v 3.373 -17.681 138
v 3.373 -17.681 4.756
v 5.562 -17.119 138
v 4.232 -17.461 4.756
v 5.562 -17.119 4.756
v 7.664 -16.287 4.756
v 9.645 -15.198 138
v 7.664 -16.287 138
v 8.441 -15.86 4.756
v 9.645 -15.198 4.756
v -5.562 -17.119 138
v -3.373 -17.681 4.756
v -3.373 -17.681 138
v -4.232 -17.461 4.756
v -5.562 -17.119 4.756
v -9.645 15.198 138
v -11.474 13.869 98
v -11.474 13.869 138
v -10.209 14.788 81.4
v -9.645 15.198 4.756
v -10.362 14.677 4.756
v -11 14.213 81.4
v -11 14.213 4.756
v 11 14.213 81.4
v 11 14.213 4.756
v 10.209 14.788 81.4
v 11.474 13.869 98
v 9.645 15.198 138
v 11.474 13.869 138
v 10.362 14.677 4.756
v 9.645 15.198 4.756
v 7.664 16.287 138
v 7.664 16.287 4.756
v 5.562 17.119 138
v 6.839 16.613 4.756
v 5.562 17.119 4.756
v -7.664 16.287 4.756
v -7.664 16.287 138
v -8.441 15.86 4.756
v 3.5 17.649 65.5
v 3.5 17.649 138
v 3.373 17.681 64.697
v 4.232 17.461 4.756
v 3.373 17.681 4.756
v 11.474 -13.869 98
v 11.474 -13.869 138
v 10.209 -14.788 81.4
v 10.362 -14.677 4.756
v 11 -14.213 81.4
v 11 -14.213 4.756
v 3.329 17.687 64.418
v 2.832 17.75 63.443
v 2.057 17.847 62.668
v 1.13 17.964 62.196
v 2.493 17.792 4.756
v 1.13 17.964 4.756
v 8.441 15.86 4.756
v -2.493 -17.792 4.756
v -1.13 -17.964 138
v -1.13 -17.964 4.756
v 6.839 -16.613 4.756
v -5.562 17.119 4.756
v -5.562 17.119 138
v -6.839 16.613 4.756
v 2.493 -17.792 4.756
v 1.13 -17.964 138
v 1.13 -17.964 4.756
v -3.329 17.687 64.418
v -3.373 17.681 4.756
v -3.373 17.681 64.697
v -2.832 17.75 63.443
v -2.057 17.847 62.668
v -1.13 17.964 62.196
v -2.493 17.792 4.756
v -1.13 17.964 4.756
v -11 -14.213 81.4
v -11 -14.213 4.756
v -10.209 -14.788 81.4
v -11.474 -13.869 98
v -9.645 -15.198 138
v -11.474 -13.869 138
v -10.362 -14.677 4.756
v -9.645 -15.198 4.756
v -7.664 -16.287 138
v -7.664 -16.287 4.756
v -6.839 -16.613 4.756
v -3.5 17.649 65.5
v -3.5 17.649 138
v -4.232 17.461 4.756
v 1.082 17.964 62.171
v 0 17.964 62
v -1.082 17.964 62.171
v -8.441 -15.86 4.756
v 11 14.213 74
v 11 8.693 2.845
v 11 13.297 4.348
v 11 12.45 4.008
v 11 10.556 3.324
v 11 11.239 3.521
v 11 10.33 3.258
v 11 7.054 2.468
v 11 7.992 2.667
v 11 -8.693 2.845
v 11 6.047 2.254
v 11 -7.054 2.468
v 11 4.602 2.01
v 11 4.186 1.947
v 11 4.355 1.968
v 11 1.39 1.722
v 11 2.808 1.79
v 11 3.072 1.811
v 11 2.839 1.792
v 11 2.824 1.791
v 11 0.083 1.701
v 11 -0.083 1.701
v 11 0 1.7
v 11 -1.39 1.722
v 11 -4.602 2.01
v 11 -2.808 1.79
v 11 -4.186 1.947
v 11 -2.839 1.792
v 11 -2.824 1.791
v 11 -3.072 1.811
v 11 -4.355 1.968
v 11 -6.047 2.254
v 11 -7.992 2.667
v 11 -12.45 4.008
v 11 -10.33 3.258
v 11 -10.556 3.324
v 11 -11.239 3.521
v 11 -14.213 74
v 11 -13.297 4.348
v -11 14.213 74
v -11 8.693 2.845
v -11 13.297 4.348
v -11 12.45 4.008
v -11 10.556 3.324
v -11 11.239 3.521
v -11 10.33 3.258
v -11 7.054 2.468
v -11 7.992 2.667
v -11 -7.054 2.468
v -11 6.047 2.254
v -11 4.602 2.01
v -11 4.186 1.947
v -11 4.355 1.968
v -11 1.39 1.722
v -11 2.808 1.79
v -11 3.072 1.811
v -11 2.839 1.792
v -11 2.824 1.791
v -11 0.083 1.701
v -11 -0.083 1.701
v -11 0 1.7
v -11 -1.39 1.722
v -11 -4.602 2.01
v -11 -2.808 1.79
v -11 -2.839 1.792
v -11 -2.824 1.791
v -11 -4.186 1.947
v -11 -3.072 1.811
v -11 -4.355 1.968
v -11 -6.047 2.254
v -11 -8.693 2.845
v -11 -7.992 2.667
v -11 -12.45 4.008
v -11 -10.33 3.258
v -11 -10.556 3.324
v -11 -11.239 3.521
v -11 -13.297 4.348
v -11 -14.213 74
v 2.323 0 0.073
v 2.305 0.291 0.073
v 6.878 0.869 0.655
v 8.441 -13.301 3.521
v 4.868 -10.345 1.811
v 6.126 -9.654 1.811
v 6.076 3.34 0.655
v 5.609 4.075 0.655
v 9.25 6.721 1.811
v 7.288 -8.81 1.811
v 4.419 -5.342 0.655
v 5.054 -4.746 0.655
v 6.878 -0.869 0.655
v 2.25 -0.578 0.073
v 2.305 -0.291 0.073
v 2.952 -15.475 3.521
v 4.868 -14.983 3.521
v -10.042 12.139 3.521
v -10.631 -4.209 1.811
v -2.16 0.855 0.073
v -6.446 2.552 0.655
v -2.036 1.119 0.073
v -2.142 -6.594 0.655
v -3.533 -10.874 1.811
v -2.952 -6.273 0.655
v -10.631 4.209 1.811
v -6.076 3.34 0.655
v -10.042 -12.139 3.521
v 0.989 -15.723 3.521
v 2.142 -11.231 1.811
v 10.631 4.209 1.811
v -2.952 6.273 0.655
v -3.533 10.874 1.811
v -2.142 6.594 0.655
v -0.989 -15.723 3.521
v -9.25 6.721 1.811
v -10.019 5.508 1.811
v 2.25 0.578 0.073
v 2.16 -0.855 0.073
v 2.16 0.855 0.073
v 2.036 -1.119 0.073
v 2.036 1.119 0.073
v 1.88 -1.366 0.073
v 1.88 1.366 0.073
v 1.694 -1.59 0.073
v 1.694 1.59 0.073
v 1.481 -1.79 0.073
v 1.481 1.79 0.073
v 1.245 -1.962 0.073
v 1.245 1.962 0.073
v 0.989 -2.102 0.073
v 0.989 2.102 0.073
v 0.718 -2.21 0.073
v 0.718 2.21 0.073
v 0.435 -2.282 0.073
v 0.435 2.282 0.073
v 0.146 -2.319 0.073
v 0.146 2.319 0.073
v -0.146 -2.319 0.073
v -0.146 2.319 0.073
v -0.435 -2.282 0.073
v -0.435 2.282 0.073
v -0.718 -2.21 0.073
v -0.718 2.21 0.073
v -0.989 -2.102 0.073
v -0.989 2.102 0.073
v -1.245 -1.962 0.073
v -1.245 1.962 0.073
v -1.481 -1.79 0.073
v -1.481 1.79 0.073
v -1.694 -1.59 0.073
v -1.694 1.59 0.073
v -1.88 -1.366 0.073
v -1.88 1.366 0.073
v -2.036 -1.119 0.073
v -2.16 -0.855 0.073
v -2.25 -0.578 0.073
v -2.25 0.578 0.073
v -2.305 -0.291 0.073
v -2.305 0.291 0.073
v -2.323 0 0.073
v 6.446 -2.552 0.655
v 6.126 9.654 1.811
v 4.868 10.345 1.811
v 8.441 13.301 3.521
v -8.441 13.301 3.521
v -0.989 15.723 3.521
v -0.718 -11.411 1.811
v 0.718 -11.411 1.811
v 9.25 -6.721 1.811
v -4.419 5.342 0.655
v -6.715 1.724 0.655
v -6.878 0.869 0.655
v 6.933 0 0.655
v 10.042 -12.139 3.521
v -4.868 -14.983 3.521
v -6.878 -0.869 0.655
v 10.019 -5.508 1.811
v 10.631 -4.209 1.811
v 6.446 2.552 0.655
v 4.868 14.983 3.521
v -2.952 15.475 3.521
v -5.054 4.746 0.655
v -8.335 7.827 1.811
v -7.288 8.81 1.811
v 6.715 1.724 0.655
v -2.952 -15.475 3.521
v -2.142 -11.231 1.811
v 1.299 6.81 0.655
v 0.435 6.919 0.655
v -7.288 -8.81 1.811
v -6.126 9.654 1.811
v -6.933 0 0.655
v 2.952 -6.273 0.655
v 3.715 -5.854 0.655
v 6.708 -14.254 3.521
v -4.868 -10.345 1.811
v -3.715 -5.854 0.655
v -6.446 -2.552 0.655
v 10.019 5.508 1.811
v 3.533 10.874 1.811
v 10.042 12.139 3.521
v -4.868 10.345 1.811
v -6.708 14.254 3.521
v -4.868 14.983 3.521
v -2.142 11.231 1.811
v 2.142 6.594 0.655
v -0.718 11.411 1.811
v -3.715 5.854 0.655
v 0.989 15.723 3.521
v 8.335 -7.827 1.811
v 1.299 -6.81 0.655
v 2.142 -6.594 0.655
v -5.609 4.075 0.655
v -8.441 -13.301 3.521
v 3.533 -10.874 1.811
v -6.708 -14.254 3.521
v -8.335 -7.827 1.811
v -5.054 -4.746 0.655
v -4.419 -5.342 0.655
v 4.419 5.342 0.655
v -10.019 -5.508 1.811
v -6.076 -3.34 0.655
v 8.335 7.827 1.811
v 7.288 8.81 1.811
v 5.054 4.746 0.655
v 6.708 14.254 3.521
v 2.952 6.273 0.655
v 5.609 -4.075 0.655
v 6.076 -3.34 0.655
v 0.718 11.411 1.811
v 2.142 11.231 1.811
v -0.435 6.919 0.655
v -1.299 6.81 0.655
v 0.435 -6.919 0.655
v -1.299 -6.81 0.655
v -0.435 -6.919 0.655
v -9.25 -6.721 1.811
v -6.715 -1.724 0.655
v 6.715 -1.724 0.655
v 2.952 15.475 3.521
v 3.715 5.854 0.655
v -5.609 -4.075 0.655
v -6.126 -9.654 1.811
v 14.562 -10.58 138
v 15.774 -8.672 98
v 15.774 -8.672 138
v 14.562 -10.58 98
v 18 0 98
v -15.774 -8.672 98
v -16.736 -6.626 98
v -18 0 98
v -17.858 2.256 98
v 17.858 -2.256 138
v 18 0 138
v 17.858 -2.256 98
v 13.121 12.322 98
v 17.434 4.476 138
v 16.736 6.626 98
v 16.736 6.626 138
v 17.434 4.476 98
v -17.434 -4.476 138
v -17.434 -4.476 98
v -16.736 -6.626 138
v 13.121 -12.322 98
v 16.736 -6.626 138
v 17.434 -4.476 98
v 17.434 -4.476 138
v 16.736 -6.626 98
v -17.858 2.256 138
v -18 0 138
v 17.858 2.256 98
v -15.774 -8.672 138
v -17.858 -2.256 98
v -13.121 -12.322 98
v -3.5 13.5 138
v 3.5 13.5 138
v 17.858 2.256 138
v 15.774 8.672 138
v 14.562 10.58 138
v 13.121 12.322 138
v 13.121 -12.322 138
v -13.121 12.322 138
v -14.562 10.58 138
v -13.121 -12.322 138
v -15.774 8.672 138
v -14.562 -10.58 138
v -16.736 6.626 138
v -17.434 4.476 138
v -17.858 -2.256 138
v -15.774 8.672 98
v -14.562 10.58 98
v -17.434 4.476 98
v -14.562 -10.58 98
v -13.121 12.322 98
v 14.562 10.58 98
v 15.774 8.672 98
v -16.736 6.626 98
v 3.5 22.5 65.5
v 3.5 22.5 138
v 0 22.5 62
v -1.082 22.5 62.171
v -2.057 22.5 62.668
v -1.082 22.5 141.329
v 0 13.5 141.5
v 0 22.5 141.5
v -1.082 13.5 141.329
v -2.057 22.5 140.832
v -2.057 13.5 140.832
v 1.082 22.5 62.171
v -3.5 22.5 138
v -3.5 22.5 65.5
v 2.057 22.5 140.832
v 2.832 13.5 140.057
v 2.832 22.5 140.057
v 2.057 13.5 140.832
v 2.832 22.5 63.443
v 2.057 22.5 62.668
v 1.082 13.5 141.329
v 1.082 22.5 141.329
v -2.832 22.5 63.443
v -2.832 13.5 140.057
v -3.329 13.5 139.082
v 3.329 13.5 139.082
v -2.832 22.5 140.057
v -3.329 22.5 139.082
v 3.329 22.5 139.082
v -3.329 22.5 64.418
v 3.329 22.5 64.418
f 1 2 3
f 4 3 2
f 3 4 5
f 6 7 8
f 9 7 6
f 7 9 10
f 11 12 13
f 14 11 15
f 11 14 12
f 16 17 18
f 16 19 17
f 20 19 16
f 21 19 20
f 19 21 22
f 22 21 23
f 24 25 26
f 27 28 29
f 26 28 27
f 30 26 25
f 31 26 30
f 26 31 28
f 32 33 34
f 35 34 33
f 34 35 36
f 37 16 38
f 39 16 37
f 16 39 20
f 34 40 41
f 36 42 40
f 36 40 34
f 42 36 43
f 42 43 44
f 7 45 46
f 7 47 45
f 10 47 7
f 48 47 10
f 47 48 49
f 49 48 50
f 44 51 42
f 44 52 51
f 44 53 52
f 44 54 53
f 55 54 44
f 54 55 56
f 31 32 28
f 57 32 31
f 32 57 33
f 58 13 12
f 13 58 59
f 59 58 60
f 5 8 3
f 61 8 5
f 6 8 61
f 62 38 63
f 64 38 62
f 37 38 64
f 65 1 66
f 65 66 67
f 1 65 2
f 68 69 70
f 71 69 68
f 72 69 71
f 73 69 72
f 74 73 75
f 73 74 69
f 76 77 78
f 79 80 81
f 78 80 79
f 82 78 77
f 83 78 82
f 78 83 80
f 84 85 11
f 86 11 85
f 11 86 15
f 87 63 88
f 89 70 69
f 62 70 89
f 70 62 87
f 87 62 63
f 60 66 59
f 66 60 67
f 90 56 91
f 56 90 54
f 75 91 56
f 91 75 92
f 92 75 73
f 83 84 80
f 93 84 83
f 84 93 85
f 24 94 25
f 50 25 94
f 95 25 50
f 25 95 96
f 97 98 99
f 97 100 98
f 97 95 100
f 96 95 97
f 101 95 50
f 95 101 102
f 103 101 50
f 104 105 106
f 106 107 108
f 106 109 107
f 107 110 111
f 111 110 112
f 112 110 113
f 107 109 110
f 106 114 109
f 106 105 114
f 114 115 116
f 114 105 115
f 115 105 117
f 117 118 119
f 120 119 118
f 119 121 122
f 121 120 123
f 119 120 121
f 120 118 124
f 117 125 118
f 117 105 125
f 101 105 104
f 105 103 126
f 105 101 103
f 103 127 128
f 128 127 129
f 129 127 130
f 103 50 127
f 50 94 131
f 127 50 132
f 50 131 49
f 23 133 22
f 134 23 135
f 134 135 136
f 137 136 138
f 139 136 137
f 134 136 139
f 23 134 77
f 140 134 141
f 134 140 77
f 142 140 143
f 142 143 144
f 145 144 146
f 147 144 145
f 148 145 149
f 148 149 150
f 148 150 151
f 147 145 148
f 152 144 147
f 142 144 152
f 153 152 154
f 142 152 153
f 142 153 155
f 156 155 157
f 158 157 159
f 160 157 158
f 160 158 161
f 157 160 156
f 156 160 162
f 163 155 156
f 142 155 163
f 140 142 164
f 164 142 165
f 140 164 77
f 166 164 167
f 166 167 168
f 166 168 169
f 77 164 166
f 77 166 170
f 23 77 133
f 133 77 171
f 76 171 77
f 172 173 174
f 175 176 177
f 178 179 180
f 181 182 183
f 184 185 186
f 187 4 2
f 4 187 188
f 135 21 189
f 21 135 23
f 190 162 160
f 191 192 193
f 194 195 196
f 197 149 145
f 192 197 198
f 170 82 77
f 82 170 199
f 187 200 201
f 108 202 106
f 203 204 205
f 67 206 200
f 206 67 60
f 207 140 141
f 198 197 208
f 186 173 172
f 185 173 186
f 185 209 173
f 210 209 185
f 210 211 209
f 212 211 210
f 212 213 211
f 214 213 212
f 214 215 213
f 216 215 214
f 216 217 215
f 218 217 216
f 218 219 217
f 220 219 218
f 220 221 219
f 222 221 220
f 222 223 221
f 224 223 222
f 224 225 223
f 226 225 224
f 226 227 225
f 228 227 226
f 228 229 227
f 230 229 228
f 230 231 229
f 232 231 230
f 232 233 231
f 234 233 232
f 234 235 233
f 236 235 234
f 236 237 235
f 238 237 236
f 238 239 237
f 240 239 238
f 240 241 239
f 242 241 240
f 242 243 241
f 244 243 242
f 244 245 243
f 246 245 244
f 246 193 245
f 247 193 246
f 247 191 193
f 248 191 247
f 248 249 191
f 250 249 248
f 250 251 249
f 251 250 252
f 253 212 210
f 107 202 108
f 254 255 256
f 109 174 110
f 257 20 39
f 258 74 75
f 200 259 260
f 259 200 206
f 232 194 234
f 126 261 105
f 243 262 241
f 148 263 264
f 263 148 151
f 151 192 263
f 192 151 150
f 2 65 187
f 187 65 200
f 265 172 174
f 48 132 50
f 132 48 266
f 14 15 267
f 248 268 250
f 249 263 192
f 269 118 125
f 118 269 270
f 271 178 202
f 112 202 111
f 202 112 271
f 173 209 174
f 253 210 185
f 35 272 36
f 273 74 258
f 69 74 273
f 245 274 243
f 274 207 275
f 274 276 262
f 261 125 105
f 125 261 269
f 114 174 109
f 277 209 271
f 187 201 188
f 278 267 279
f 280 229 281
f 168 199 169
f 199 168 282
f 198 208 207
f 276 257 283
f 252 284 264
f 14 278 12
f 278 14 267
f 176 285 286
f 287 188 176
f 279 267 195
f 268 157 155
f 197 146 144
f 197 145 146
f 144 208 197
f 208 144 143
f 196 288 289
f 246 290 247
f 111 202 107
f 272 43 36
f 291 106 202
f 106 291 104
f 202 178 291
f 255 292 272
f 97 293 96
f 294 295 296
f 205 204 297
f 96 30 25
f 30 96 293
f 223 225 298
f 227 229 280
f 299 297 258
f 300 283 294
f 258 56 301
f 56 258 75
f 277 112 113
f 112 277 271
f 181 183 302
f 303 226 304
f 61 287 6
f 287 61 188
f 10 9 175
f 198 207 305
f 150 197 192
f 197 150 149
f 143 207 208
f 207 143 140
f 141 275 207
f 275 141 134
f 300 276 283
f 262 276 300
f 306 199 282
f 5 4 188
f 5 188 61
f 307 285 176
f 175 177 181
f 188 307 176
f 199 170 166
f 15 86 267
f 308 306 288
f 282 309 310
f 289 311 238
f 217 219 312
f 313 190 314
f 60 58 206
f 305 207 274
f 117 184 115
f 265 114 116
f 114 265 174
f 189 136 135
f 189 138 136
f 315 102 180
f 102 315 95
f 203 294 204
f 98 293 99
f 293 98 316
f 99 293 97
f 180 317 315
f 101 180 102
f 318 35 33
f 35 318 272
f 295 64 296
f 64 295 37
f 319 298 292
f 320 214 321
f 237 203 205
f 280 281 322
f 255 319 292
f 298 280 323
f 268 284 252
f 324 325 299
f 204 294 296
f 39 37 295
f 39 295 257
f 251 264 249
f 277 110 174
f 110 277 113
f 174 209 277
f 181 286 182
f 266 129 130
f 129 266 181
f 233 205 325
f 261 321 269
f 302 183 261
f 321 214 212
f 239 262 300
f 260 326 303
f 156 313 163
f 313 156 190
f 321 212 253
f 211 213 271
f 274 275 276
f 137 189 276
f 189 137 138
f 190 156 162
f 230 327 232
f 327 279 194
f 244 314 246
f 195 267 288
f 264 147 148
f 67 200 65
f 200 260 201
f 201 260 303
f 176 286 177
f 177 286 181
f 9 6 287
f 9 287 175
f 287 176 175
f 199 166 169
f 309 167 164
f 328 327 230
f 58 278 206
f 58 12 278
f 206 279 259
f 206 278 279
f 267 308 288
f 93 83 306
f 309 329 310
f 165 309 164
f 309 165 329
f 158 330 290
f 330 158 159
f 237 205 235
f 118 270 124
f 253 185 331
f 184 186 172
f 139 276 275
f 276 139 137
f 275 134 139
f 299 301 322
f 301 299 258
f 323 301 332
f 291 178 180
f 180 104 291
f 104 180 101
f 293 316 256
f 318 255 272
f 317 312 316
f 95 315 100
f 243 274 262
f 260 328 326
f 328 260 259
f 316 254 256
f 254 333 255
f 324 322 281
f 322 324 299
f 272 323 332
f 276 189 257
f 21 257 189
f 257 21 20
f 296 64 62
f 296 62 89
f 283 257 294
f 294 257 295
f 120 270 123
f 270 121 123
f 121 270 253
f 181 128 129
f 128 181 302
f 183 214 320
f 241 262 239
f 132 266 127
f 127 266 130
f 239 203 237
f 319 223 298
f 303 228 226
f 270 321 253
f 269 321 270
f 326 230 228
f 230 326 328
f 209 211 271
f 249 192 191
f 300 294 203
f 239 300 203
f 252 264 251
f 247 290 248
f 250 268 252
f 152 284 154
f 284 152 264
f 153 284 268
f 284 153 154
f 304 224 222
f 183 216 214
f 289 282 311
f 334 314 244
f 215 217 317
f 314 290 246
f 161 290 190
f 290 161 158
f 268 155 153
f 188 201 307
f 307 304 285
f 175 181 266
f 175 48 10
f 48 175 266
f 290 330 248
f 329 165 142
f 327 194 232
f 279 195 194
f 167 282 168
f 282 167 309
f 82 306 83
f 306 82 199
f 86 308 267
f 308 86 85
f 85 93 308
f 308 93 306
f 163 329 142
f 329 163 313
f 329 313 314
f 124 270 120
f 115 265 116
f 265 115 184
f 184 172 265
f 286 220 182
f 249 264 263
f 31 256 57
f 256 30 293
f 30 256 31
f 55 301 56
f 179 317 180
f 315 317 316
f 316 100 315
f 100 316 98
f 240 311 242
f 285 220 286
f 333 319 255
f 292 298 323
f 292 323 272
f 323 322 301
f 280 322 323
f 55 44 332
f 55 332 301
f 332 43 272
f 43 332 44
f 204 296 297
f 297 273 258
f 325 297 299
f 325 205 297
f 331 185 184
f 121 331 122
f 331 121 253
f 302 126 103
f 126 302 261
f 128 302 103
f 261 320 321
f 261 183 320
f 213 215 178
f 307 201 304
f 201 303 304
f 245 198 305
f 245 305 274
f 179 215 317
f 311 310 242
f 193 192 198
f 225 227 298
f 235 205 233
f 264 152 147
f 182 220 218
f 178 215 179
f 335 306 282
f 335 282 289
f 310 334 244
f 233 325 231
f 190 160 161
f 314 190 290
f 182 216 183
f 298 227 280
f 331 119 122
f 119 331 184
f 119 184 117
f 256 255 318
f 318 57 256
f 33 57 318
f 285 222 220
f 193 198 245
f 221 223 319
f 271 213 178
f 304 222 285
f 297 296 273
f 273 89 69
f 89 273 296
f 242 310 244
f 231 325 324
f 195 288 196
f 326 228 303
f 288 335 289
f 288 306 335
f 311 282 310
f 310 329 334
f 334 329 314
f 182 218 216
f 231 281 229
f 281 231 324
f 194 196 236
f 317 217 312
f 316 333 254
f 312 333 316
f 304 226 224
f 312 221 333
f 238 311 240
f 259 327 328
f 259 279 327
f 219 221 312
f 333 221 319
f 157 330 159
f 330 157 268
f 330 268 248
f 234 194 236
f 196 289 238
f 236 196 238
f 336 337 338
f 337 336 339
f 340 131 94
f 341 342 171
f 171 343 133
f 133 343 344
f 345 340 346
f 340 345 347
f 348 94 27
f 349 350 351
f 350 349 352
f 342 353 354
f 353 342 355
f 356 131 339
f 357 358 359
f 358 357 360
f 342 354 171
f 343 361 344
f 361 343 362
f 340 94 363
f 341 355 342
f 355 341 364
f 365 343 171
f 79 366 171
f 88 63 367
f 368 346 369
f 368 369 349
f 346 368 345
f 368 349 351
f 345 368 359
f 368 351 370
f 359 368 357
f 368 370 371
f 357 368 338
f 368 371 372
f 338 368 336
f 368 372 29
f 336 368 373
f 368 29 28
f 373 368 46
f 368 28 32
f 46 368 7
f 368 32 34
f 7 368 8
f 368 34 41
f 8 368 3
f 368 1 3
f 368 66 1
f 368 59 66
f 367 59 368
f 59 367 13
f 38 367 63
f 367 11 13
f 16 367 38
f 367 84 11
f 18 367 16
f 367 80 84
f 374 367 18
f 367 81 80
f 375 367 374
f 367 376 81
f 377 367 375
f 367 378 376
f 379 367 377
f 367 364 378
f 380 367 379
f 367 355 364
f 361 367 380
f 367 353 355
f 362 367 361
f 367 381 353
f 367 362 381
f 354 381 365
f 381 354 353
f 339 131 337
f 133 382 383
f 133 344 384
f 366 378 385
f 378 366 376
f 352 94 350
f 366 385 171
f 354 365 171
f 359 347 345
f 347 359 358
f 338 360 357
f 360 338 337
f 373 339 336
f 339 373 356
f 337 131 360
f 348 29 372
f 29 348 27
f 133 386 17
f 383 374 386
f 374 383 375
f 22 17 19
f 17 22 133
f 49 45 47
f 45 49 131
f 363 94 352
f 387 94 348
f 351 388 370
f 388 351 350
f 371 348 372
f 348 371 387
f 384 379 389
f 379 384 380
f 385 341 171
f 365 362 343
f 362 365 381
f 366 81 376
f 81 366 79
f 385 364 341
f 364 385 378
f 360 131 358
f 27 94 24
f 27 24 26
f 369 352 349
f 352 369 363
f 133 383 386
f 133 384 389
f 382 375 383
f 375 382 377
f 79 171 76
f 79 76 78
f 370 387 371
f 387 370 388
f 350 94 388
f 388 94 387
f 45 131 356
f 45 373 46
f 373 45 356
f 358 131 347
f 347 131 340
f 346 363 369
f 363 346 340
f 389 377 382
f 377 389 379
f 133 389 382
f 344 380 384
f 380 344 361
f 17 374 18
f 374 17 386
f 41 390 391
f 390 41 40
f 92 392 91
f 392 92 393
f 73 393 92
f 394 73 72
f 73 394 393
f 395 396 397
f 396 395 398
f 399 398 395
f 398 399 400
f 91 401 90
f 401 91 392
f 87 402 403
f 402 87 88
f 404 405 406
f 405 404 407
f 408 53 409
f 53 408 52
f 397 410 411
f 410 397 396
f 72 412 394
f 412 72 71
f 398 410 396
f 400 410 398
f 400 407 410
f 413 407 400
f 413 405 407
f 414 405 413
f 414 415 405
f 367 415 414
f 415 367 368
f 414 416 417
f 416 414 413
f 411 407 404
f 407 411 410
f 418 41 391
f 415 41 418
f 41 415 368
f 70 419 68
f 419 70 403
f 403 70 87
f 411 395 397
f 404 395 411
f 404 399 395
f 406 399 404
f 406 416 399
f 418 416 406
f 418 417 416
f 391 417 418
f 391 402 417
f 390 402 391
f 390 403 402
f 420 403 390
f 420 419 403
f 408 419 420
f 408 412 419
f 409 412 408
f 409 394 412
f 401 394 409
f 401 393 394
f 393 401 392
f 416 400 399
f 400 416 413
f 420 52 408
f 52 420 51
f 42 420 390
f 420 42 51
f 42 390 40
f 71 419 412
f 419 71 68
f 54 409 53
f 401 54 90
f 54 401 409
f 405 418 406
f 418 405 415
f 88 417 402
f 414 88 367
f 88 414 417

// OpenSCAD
promitacka_d = 36;
promitacka_l = 138;

stred_l = 24;

promitacka_madlo_l = 74;
promitacka_madlo_w = 22;

predek_l = 40;

// ?
cudlik_d = 7;
cudlik_h = 4.5;

module madlo(l) {
    intersection() {
        cylinder(d = promitacka_d, h = l, center = true, $fn = 50);
        cube([promitacka_madlo_w, promitacka_d, l], center = true);
    }
}
*madlo();

module predek() {
    cylinder(d = promitacka_d, h = predek_l, center = true, $fn = 50);
}
*predek();

module telo() {
    // aproximace prechodu
    hull() {
        translate([0, 0, predek_l / 2 + 24]) predek();
        translate([0, 0, 1 / 2]) madlo(1);
    }

    // hack na odstraneni diry od intersection
    madlo(promitacka_madlo_l / 5);

    // madlo
    translate([0, 0, - promitacka_madlo_l / 2]) intersection() {
        madlo(promitacka_madlo_l);
        sphere(d = promitacka_madlo_l, $fn = 50);
    }
}
*telo();

module cudlik() {
    translate([0, 36 / 2, - cudlik_d / 2])
        rotate([90, 0, 0])
            cylinder(d = cudlik_d, h = 2 * cudlik_h, center = true, $fn = 20);
}
*cudlik();

module cudlik_zasuvka() {
    hull() {
        translate([0, 0, - 5]) cudlik();
        translate([0, 0, predek_l + stred_l + cudlik_d / 2]) cudlik();
    }
}
*cudlik_zasuvka();

module promitacka() {
    translate([0, 0, promitacka_madlo_l]) union() {
        telo();
        cudlik_zasuvka();
    }
}

promitacka();
